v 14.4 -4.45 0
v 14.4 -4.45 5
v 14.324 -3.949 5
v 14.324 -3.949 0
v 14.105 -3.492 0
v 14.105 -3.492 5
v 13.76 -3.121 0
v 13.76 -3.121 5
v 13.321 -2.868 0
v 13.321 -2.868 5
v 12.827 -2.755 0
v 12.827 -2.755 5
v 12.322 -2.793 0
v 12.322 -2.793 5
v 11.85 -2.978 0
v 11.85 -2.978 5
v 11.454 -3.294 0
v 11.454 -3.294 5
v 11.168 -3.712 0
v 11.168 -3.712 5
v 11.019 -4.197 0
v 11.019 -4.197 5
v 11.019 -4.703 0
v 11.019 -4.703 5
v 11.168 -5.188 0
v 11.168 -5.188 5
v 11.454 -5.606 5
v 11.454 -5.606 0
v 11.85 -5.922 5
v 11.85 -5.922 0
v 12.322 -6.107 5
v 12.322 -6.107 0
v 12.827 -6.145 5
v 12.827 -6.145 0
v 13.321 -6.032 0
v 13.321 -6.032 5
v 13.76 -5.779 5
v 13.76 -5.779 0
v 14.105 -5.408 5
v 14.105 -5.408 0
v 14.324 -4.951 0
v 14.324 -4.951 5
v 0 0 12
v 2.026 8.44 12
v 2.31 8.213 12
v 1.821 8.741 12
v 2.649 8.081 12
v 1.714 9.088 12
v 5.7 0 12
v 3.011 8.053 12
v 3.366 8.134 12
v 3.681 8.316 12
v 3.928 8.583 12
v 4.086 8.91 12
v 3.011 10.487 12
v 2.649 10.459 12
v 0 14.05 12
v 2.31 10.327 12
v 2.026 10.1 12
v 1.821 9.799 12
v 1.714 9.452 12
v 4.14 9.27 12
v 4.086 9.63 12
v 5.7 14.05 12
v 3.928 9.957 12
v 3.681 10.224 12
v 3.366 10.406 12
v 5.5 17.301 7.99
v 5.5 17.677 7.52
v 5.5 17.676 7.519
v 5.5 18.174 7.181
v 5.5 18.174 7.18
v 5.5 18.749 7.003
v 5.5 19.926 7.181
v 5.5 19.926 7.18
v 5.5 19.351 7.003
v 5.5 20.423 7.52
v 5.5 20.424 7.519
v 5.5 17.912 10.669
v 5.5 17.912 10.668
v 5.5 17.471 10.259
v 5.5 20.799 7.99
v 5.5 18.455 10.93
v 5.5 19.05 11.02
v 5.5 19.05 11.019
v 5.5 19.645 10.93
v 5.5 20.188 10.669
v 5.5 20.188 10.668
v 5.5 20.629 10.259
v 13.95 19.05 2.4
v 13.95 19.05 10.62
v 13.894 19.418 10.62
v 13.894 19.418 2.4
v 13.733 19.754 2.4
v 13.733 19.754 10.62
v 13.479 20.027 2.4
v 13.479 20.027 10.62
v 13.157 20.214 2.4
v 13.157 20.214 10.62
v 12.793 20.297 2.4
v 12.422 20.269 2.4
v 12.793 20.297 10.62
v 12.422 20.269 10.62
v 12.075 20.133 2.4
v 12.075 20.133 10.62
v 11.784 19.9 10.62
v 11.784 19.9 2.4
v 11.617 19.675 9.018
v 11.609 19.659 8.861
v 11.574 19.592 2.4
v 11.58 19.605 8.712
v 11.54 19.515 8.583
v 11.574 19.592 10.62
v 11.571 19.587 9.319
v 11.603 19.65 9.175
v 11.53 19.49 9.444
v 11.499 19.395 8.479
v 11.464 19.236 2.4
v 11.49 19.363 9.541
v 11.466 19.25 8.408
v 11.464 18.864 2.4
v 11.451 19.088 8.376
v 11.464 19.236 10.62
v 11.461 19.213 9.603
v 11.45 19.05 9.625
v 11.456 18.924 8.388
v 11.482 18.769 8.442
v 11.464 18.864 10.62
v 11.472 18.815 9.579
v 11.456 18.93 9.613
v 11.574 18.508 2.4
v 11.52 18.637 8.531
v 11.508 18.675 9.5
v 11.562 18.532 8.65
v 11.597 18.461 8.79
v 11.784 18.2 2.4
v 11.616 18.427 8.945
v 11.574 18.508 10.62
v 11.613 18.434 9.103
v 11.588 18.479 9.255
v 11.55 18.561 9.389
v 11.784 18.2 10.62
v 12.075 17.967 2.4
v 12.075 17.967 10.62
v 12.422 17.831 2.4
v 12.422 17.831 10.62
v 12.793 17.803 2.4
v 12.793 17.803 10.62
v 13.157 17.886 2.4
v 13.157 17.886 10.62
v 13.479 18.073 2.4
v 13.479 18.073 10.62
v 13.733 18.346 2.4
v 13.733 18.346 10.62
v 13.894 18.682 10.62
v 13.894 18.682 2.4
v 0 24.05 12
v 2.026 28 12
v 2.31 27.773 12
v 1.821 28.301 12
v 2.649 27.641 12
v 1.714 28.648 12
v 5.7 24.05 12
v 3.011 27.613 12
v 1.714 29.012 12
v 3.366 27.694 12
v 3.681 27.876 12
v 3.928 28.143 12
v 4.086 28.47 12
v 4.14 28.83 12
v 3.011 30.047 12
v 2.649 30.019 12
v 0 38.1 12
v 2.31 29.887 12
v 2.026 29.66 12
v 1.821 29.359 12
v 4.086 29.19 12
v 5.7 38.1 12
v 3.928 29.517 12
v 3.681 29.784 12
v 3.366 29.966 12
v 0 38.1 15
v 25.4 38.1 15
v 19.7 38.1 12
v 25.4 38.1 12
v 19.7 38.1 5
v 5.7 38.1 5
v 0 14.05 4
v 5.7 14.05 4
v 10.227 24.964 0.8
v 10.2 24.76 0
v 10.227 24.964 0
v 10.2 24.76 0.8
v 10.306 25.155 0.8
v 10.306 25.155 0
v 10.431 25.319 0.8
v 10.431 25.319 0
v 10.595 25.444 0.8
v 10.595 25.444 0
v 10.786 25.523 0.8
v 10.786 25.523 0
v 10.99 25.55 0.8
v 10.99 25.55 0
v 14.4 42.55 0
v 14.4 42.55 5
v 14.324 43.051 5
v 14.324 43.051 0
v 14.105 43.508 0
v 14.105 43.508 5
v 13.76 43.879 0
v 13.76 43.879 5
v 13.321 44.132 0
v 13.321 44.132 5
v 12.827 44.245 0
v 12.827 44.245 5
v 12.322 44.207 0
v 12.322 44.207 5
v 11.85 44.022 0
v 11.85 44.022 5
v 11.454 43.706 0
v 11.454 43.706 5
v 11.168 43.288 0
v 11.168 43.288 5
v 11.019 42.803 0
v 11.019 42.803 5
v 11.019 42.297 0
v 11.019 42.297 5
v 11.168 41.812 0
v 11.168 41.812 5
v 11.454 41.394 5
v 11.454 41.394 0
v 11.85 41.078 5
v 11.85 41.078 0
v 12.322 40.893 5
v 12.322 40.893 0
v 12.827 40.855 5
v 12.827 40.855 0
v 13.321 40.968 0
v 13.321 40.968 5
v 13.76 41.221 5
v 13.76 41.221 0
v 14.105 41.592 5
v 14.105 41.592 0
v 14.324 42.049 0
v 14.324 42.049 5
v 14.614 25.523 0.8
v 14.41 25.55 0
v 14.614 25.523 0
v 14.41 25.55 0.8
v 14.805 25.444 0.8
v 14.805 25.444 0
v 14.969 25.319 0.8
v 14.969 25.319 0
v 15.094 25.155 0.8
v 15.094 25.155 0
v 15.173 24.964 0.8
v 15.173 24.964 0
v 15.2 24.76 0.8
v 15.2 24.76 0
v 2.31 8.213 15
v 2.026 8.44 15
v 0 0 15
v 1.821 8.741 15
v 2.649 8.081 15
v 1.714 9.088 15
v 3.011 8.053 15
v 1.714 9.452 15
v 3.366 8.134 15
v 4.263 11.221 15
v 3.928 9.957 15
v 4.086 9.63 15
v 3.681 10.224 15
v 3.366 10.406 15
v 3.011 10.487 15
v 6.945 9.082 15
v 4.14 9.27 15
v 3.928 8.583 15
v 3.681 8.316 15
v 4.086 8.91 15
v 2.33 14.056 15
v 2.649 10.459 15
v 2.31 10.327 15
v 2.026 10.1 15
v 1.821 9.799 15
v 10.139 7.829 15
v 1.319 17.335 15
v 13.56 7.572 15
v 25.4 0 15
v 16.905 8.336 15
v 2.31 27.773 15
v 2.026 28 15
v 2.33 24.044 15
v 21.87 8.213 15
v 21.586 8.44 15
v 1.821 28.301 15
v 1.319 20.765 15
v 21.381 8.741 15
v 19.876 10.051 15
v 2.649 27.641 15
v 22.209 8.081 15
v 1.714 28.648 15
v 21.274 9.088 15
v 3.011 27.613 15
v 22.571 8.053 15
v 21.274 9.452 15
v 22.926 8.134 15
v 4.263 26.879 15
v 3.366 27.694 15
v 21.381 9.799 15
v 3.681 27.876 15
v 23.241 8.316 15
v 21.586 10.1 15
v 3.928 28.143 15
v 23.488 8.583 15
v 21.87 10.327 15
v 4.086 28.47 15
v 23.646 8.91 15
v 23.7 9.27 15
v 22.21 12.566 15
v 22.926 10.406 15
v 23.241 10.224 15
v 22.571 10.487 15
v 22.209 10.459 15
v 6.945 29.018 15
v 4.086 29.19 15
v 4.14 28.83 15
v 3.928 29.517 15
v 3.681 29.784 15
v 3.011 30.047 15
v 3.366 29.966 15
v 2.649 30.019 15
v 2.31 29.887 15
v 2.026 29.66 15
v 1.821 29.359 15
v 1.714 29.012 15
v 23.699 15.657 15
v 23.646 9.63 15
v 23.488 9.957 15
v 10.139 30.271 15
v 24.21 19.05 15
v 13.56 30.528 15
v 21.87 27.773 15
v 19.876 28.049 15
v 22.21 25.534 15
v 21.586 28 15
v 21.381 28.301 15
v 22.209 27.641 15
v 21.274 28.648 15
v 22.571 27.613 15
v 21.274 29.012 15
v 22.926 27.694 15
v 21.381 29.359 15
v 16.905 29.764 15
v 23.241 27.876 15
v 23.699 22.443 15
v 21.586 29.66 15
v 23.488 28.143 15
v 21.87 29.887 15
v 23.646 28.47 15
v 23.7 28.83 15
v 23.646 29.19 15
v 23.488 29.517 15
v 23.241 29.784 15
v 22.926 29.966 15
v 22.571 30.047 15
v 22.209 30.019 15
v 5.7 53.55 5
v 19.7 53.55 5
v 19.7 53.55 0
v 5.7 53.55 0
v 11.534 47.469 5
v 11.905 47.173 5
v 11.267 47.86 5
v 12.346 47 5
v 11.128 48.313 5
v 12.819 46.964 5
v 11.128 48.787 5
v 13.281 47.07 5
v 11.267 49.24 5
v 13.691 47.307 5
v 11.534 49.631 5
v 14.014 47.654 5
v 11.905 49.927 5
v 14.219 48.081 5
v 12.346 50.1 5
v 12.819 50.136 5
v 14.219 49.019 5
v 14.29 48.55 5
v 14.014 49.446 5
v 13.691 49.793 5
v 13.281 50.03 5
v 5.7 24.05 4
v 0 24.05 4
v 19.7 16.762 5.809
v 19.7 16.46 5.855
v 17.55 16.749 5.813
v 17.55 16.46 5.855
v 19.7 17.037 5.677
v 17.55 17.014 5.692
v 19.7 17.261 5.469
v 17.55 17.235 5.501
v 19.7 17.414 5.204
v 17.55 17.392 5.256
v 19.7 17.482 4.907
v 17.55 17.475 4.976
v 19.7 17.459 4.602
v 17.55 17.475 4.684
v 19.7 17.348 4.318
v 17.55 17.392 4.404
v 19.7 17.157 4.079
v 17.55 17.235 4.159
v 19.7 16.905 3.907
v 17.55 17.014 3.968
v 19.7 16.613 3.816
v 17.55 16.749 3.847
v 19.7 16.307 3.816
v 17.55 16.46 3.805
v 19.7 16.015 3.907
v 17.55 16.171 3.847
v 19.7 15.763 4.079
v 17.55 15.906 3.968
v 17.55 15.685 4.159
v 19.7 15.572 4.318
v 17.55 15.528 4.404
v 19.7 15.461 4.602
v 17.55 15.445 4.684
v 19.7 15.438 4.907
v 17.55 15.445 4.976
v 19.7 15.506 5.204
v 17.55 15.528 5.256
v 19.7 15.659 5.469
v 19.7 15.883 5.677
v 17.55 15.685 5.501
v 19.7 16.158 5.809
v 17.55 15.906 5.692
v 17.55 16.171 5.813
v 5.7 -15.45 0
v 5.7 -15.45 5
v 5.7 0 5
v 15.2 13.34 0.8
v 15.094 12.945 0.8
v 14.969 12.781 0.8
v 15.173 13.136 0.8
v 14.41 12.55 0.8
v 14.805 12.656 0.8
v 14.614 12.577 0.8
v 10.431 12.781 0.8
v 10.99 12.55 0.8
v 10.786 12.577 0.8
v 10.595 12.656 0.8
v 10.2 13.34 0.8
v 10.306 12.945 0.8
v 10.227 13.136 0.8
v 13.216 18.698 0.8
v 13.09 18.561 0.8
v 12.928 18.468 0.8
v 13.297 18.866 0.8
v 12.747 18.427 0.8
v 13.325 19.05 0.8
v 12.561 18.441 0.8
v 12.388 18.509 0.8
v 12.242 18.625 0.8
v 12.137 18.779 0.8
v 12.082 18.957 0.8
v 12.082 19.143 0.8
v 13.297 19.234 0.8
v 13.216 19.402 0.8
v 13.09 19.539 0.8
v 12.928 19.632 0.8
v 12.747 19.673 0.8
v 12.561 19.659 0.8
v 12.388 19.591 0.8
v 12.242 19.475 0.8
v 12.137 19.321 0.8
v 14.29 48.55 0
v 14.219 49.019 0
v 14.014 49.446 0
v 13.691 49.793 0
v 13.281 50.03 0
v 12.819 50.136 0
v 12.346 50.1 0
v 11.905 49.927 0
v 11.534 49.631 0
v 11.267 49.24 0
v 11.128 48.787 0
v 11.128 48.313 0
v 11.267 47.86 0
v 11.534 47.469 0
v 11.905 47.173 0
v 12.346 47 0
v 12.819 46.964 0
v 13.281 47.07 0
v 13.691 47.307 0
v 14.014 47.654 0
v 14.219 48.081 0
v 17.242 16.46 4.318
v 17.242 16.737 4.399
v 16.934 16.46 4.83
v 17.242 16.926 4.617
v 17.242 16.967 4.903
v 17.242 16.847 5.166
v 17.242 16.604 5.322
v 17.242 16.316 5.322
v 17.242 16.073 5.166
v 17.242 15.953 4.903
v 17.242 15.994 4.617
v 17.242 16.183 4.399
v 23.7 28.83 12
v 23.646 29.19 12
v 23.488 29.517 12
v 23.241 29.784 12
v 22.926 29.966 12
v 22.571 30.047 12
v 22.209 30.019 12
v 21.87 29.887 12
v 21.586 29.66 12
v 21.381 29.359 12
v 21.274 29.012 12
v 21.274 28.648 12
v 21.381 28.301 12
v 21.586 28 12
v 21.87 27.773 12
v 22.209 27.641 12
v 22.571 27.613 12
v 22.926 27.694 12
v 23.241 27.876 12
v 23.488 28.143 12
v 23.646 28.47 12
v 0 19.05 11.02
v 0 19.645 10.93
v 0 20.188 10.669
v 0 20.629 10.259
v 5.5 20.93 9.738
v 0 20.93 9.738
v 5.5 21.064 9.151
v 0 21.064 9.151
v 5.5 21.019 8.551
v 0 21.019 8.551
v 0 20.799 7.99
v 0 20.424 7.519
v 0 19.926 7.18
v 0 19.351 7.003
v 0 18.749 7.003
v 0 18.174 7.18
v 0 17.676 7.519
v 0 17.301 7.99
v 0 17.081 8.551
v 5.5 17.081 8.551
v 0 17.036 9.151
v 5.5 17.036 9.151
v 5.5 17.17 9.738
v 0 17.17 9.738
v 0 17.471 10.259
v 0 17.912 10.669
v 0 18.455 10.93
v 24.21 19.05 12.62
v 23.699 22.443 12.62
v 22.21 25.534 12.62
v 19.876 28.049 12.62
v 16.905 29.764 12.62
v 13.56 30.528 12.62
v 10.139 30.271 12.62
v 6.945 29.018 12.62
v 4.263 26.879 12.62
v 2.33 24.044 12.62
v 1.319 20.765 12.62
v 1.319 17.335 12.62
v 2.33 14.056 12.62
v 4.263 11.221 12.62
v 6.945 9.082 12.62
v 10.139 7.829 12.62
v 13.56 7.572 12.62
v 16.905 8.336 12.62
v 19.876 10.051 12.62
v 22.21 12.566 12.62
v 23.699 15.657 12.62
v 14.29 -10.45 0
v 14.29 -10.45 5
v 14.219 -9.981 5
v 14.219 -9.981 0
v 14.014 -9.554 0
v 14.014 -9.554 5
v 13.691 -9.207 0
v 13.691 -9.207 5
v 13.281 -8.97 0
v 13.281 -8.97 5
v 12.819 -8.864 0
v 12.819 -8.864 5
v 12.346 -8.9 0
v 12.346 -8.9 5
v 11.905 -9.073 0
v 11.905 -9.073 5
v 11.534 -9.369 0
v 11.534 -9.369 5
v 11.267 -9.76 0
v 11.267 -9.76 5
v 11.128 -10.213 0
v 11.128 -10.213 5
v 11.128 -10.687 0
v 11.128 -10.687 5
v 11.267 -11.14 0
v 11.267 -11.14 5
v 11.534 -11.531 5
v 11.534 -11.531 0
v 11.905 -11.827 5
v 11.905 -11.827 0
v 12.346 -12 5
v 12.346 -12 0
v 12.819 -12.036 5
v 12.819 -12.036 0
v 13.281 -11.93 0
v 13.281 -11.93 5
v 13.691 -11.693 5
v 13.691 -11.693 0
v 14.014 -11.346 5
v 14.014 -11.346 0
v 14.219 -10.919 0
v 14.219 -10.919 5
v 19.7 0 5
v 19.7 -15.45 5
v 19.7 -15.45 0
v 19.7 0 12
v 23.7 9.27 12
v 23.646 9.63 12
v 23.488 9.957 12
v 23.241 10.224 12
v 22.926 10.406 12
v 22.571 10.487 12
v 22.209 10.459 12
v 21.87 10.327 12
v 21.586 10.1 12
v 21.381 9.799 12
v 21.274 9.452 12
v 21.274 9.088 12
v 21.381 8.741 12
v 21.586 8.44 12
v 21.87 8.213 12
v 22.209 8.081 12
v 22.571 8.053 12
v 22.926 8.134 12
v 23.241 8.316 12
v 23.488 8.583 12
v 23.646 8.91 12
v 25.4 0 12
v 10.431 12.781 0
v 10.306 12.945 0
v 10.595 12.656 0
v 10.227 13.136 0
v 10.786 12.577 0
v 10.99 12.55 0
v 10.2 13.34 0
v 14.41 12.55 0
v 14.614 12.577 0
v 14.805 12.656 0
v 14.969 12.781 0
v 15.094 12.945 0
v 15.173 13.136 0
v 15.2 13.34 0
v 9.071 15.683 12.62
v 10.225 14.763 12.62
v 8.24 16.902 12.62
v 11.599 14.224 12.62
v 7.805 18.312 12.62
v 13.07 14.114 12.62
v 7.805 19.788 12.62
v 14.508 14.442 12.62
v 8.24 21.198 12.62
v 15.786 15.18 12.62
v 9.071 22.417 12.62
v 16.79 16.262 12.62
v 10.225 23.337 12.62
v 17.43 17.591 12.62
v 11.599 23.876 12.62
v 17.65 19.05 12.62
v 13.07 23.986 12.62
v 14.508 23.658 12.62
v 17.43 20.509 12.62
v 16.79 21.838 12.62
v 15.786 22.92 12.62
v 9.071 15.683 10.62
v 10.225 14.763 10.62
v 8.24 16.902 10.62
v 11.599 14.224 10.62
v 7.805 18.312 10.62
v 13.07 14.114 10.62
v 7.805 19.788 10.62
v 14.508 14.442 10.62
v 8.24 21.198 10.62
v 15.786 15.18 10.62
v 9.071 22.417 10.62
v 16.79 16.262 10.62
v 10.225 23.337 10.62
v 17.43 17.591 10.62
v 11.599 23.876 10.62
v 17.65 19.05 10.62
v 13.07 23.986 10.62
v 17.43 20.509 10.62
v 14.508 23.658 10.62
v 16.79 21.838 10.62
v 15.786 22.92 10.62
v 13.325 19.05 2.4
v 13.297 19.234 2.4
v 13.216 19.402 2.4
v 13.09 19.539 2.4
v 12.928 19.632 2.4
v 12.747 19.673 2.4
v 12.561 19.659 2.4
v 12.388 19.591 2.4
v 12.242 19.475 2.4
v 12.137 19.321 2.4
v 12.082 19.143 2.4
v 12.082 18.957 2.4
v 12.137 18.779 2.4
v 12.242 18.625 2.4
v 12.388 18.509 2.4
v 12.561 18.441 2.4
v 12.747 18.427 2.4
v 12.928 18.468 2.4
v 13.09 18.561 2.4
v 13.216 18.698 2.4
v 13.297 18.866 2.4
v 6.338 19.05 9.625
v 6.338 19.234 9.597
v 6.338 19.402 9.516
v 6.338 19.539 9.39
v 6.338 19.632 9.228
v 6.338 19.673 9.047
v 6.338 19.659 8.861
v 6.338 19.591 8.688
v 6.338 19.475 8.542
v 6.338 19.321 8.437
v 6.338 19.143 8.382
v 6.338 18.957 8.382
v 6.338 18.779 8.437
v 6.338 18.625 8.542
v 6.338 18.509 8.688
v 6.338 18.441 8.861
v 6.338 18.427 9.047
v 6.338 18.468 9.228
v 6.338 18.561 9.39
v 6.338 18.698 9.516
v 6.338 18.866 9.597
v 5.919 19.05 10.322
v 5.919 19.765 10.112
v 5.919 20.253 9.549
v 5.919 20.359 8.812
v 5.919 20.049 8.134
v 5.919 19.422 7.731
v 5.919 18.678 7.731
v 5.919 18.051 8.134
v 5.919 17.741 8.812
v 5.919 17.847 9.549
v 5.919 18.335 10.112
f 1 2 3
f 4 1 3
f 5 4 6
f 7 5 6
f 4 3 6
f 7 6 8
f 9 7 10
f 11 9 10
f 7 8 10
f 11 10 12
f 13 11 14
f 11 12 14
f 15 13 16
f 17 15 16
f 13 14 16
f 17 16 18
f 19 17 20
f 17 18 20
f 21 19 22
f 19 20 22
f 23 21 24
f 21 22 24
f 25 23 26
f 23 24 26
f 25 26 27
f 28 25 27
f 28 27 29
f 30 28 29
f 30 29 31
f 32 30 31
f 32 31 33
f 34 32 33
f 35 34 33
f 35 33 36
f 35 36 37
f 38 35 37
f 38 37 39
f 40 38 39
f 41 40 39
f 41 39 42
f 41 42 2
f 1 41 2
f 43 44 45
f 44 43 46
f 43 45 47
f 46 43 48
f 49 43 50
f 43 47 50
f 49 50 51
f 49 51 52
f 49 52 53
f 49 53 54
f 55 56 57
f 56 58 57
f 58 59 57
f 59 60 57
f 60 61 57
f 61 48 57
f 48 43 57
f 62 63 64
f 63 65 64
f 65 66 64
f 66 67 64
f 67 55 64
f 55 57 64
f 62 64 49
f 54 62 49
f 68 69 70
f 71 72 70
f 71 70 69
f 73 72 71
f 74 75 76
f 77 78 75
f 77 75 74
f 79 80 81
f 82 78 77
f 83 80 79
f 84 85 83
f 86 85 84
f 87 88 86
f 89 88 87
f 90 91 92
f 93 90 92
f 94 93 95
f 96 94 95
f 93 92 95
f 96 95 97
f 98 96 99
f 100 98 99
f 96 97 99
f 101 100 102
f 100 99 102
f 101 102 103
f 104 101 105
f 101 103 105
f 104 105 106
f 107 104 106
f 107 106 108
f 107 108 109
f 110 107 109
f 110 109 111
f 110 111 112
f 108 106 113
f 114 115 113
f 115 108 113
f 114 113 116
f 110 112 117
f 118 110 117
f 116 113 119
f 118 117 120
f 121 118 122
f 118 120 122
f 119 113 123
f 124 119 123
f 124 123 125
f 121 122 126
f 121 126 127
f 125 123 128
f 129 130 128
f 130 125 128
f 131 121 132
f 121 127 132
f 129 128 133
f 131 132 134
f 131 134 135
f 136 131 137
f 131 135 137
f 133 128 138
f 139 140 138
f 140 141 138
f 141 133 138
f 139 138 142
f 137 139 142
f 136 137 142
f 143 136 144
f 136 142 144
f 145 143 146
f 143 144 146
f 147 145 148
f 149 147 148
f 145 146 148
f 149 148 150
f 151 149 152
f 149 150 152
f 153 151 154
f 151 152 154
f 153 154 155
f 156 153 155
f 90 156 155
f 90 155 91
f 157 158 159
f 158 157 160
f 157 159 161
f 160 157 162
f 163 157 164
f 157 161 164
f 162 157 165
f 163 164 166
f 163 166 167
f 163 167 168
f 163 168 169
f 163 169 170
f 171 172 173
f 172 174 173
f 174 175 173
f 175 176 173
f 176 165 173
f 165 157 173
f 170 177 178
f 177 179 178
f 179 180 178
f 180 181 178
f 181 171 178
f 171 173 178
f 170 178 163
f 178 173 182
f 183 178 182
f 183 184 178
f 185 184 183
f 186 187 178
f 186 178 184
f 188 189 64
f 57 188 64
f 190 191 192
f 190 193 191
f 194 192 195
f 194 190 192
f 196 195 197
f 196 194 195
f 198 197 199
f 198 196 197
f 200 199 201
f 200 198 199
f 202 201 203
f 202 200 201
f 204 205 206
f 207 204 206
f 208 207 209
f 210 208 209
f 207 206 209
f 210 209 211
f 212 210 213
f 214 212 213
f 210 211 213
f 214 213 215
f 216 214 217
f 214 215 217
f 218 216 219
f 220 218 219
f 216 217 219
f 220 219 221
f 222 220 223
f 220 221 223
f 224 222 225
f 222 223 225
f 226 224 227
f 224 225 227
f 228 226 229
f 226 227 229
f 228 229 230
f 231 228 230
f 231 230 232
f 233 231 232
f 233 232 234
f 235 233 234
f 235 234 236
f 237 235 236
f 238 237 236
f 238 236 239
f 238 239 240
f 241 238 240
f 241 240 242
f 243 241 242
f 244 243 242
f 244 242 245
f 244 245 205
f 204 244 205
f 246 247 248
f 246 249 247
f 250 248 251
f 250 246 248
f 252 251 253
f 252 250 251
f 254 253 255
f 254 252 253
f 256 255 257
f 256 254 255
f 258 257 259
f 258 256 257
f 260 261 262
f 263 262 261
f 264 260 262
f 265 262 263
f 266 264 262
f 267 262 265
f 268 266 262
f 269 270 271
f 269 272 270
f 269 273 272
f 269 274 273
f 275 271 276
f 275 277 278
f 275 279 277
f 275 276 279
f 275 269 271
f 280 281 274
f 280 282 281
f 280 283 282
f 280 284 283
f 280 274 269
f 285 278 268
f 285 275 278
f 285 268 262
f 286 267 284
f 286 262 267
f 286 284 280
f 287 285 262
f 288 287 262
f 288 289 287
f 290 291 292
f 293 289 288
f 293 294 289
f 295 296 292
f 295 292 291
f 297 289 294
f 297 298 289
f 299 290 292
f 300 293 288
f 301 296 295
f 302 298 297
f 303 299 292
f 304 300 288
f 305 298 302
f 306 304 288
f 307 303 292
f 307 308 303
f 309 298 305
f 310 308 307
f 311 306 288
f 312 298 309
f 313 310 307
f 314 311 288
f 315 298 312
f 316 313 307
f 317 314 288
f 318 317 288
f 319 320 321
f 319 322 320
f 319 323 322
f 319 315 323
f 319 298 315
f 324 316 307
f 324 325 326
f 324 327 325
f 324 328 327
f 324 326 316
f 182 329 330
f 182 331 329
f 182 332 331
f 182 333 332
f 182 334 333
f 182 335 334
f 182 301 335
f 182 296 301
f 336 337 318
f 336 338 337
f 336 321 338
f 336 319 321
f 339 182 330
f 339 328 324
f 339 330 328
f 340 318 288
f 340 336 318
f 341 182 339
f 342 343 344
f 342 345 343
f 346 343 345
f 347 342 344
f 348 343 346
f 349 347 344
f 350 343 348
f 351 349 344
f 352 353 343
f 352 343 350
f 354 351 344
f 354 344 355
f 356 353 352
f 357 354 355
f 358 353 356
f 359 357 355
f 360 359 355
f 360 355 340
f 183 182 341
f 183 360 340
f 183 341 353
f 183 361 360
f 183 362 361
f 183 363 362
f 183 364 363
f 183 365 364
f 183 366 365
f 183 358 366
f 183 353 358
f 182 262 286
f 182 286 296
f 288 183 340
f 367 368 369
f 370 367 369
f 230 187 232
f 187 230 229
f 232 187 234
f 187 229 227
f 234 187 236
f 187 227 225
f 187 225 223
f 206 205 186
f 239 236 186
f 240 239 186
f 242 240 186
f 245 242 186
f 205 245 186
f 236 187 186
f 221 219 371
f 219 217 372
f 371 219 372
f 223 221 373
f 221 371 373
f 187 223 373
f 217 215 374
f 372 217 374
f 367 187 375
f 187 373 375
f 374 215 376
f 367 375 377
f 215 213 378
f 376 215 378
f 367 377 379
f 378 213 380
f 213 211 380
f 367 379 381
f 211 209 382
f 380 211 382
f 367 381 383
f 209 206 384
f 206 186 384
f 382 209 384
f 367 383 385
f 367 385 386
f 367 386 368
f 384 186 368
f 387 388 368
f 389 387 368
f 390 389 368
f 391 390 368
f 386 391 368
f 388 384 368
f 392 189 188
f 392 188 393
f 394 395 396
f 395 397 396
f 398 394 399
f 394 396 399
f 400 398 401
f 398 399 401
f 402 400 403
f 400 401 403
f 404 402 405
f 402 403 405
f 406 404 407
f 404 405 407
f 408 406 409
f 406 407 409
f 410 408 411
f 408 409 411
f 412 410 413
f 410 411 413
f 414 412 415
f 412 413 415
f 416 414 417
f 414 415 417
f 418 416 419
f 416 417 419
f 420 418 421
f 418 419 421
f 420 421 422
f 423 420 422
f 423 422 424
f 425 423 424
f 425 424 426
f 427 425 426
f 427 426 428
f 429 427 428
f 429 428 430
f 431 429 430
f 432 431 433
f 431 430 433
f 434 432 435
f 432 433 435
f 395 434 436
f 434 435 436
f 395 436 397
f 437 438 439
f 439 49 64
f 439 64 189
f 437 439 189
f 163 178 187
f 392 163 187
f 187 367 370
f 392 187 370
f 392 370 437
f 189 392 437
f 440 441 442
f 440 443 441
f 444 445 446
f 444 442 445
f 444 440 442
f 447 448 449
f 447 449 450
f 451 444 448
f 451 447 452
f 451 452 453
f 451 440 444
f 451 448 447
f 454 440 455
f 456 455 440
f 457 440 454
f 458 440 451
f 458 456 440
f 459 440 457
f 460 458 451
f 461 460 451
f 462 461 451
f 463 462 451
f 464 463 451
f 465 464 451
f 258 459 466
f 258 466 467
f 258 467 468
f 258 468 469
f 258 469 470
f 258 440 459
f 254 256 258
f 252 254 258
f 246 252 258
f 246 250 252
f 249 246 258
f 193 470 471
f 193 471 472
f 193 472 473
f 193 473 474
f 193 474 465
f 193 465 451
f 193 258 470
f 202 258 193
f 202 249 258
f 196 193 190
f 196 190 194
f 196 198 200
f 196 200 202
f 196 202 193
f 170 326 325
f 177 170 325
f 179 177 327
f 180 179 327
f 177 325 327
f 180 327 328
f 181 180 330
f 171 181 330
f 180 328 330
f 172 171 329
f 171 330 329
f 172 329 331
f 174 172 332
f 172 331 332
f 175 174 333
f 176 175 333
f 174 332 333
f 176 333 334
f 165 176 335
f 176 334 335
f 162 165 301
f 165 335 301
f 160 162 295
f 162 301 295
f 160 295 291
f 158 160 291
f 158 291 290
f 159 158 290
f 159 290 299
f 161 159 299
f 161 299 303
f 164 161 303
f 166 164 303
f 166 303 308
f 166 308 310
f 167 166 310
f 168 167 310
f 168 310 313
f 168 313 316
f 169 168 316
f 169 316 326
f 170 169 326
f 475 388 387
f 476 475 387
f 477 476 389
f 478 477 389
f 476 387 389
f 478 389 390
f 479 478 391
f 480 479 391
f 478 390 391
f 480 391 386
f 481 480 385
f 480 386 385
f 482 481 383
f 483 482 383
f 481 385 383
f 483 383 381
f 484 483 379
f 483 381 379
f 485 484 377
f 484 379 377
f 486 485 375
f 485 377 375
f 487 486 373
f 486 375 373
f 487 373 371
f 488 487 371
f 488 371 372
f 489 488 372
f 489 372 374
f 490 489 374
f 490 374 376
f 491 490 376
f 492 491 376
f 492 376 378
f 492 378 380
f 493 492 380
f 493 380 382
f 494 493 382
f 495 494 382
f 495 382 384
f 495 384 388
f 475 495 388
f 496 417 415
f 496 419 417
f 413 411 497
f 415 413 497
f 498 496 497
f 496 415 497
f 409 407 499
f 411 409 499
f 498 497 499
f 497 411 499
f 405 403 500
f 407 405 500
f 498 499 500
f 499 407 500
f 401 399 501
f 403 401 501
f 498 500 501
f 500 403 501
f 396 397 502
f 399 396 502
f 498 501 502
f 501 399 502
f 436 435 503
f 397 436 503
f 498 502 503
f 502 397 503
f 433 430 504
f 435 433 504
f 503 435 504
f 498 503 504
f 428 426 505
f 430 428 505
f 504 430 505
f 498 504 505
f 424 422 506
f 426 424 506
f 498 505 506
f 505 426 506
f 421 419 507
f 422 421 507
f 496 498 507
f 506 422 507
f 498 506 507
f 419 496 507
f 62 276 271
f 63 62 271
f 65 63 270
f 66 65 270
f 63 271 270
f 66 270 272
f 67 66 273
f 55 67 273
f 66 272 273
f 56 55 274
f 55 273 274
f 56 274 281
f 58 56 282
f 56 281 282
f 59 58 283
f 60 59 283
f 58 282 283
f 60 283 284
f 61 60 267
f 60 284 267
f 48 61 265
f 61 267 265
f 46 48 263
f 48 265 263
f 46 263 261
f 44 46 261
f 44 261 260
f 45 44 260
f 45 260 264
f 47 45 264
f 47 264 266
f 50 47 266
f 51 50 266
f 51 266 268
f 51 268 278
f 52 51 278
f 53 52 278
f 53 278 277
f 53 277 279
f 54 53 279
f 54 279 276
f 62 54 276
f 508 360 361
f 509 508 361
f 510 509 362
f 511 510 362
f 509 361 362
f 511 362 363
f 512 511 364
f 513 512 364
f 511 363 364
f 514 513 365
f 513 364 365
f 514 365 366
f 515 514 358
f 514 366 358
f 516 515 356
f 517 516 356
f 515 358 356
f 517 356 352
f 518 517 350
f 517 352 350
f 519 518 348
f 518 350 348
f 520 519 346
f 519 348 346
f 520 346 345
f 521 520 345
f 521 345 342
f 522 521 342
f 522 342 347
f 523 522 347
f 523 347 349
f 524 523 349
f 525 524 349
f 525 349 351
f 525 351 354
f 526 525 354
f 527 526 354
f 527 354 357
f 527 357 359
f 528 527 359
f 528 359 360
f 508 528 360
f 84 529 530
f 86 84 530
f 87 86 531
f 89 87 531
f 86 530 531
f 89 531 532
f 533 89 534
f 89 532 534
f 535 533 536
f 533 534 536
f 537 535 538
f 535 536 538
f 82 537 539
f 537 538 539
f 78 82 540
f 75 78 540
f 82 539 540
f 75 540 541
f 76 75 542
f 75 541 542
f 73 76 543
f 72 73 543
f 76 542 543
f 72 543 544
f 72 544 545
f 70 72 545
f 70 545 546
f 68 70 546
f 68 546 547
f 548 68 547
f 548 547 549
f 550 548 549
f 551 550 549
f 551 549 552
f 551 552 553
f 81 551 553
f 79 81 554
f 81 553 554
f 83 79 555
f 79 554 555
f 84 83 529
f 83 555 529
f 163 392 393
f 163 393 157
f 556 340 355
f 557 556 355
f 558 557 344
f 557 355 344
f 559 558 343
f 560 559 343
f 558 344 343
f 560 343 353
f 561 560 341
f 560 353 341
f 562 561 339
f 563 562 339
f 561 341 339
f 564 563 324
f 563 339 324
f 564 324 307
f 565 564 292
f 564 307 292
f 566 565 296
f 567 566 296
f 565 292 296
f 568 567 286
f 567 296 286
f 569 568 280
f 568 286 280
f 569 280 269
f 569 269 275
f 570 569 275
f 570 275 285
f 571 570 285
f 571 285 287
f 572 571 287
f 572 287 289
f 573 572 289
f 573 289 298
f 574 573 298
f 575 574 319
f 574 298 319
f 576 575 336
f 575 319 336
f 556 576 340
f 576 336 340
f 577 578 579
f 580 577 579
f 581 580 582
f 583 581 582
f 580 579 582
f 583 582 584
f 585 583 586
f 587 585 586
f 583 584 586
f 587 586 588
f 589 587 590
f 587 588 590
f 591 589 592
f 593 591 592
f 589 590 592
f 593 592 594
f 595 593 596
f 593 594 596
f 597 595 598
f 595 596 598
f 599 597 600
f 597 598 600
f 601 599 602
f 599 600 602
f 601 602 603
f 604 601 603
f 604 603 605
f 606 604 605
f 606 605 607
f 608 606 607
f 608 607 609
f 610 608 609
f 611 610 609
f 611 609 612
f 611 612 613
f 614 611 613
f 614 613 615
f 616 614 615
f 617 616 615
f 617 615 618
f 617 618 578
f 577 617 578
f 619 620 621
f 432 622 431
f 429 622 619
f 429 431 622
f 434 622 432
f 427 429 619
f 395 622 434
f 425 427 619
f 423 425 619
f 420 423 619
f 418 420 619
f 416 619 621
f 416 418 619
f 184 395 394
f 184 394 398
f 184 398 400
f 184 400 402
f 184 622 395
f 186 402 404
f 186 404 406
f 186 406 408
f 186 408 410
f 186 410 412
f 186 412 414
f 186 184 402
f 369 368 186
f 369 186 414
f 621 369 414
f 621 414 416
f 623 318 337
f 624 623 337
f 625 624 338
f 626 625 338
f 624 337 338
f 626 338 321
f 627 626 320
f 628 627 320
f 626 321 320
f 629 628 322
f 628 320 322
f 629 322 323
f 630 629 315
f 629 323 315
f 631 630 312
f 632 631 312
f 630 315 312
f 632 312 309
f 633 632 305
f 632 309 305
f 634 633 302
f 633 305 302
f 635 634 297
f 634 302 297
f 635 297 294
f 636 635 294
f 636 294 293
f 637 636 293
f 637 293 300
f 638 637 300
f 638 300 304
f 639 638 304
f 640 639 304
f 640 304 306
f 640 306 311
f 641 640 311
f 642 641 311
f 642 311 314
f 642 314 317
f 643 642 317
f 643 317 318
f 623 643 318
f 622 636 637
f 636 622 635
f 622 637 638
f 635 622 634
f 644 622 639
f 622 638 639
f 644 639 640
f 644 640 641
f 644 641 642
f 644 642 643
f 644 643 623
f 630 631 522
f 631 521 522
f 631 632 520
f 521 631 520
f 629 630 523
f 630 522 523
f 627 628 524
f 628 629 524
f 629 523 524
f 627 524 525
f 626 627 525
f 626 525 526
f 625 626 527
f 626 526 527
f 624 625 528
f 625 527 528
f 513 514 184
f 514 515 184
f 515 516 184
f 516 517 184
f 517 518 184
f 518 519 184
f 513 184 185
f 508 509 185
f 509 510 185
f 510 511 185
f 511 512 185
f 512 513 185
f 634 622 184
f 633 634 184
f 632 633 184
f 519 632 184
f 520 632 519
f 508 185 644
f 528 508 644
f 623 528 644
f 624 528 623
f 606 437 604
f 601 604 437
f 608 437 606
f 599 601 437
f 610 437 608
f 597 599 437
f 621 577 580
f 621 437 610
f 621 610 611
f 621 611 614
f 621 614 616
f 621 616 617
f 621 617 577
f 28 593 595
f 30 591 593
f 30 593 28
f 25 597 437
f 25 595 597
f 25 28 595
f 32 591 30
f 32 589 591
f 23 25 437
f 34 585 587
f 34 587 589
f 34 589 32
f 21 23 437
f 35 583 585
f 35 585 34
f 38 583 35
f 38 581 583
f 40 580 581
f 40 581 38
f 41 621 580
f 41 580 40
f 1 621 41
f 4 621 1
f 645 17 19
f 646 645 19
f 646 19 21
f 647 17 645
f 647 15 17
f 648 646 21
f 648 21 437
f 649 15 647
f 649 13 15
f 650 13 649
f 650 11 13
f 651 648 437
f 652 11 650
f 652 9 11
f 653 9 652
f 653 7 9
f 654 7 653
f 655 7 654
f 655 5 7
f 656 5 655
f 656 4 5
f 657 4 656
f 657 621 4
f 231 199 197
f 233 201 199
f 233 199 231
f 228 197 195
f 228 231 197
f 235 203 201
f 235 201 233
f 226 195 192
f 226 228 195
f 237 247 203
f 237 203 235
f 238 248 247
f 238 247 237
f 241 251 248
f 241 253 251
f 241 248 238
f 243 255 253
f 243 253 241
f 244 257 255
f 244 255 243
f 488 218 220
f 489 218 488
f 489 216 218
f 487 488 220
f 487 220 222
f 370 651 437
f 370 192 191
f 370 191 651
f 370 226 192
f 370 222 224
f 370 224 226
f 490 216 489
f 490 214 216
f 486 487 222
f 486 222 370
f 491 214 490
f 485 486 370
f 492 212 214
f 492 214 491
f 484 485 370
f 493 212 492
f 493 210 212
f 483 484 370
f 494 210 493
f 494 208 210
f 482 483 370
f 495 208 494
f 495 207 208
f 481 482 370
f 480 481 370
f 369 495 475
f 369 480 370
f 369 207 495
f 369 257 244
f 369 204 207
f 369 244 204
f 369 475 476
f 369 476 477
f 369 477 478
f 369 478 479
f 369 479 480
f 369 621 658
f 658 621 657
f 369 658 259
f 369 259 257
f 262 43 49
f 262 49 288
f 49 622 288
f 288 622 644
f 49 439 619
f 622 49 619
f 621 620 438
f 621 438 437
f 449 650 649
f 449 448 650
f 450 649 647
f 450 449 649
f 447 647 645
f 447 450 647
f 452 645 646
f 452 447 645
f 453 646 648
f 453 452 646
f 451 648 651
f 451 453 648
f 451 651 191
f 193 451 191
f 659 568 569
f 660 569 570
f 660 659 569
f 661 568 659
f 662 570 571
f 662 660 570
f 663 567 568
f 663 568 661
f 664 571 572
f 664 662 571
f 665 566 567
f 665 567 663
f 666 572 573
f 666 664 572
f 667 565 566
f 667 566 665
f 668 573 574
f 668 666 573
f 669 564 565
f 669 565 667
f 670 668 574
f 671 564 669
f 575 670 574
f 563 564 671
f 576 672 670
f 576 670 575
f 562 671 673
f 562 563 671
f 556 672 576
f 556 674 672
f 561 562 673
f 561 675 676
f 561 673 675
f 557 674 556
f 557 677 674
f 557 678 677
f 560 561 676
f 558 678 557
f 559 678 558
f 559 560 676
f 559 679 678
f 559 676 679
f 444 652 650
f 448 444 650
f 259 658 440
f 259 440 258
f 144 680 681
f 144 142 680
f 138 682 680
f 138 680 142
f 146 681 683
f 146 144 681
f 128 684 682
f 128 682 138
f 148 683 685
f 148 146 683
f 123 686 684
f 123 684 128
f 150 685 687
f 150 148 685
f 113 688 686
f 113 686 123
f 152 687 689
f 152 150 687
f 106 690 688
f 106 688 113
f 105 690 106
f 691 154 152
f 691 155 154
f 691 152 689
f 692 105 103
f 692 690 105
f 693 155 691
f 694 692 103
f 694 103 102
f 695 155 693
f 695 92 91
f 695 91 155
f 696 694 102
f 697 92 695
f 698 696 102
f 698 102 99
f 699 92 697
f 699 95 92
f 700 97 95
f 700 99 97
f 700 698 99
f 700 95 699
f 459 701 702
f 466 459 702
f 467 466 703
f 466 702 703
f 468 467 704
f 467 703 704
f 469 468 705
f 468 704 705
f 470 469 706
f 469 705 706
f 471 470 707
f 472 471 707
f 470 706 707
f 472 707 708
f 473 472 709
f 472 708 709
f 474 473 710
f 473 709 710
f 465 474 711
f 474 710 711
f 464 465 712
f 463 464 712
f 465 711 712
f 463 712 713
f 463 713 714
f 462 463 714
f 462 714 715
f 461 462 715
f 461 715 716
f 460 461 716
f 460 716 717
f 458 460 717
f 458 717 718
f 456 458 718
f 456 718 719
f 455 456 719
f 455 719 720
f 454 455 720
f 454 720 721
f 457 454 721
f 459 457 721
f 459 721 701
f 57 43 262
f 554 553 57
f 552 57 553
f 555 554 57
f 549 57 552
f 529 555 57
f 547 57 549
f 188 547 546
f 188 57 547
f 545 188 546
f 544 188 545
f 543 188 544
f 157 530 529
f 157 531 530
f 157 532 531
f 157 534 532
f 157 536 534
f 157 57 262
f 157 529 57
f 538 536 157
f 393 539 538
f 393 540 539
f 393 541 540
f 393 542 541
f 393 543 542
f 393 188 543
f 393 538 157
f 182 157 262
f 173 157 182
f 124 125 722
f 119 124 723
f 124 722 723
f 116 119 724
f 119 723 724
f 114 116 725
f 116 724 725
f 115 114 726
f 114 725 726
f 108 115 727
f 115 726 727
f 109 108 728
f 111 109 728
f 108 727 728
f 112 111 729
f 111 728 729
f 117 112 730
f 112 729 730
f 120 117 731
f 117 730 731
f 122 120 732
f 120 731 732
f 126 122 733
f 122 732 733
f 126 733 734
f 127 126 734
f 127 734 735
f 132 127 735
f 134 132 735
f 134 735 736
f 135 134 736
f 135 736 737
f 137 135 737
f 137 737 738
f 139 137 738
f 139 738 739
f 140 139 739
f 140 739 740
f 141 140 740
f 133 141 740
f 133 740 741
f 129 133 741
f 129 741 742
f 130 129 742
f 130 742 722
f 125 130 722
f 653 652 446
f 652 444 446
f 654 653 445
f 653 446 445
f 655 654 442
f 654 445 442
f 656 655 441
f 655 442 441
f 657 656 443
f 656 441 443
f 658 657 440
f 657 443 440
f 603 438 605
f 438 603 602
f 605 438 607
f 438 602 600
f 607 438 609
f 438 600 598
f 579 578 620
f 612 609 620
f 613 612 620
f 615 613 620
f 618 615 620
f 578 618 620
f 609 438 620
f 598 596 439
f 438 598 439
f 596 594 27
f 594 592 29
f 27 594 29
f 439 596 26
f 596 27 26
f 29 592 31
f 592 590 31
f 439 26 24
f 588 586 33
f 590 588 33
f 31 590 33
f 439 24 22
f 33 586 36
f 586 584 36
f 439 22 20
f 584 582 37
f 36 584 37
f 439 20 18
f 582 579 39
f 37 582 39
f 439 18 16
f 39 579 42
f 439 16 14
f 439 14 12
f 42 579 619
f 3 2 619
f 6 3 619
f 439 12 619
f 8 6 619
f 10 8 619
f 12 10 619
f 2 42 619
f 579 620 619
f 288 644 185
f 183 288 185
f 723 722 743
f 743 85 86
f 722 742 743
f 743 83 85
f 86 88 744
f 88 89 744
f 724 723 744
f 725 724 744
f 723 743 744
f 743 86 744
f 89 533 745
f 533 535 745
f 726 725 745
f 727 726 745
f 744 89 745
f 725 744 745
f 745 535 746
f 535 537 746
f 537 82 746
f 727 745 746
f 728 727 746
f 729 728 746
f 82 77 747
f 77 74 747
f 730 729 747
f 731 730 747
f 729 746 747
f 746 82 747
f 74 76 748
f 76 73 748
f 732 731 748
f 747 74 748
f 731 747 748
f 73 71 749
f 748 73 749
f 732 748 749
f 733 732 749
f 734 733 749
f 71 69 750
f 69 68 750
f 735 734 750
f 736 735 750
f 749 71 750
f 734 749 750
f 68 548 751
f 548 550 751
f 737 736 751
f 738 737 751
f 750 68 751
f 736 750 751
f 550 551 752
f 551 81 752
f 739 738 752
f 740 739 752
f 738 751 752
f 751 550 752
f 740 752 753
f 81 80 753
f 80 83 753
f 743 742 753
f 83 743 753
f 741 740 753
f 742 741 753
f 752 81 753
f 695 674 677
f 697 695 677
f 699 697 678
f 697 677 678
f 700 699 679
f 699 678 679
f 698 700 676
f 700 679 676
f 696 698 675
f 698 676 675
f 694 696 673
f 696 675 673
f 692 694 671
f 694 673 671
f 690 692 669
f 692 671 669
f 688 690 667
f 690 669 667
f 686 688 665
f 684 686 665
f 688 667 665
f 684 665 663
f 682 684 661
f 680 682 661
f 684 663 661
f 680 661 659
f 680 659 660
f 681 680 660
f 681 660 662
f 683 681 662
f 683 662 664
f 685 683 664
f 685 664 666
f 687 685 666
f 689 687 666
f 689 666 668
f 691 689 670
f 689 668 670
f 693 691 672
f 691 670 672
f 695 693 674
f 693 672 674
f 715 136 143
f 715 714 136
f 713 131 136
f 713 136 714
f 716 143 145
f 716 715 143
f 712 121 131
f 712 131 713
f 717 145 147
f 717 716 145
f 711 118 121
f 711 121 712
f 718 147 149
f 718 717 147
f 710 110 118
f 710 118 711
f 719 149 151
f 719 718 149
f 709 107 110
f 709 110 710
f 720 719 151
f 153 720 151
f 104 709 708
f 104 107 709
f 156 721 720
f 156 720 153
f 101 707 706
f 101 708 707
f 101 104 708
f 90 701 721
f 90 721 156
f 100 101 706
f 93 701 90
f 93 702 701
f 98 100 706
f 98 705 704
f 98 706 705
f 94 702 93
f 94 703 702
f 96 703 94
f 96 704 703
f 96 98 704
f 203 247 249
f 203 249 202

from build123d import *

# Parameters (mm, degrees)
SKETCH1_W                          = 25.4
SKETCH1_H                          = 38.1
BOSS_EXTRUDE1_DEPTH                = 15
SKETCH2_R                          = 11.51
CUT_EXTRUDE1_DEPTH                 = 2.38
SKETCH3_R                          = 4.95
CUT_EXTRUDE2_DEPTH                 = 2
SKETCH4_R                          = 0.625
CUT_EXTRUDE3_DEPTH                 = 48.005897502
SKETCH5_R                          = 1.22
CUT_EXTRUDE4_DEPTH                 = 49.184748624
SKETCH7_W                          = 5.7
SKETCH7_H                          = 12
CUT_EXTRUDE5_DEPTH                 = 49.184748624
SKETCH12_W                         = 5
SKETCH12_H                         = 15.45
BOSS_EXTRUDE2_DEPTH                = 14
SKETCH13_R                         = 1.59
SKETCH13_R_2                       = 1.7
CUT_EXTRUDE8_DEPTH                 = 7.5
TAP_DRILL_FOR_M2_5X0_45_TAP1_D     = 2.05
TAP_DRILL_FOR_M2_5X0_45_TAP1_DEPTH = 2.15
TAP_DRILL_FOR_M2_5X0_45_TAP1_TIP   = 0.615882135
SKETCH21_W                         = 5
SKETCH21_H                         = 13
CUT_EXTRUDE10_DEPTH                = 0.8
FILLET1_R                          = 0.79
SKETCH22_W                         = 8
SKETCH22_H                         = 10
BOSS_EXTRUDE3_DEPTH                = 5.7
SKETCH23_R                         = 2.02
CUT_EXTRUDE11_DEPTH                = 5.5
TAP_DRILL_FOR_10_32_TAP1_D         = 4.0386
TAP_DRILL_FOR_10_32_TAP1_DEPTH     = 5.5
TAP_DRILL_FOR_10_32_TAP1_TIP       = 1.213317848
SKETCH26_R                         = 0.625
CUT_EXTRUDE12_DEPTH                = 12.7
SKETCH27_R                         = 1.25
CUT_EXTRUDE13_DEPTH                = 8.22


with BuildPart() as part:
    # Sketch1 → Boss-Extrude1 (new body)
    with BuildSketch(Plane.XY):
        with Locations((12.7, 19.05)):
            Rectangle(SKETCH1_W, SKETCH1_H)
    extrude(amount=BOSS_EXTRUDE1_DEPTH)

    # Sketch2 → Cut-Extrude1 (cut)
    with BuildSketch(Plane.XY.offset(15)):
        with Locations((12.7, 19.05)):
            Circle(SKETCH2_R)
    extrude(amount=-CUT_EXTRUDE1_DEPTH, mode=Mode.SUBTRACT)

    # Sketch3 → Cut-Extrude2 (cut)
    with BuildSketch(Plane.XY.offset(12.62)):
        with Locations((12.7, 19.05)):
            Circle(SKETCH3_R)
    extrude(amount=-CUT_EXTRUDE2_DEPTH, mode=Mode.SUBTRACT)

    # Sketch4 → Cut-Extrude3 (cut, through all)
    with BuildSketch(Plane.XY.offset(10.62)):
        with Locations((12.7, 19.05)):
            Circle(SKETCH4_R)
    extrude(amount=-CUT_EXTRUDE3_DEPTH, mode=Mode.SUBTRACT)

    # Sketch5 → Cut-Extrude4 (cut, through all)
    with BuildSketch(Plane.XY.offset(15)):
        with Locations((2.92, 28.83)):
            Circle(SKETCH5_R)
        with Locations((22.48, 28.83)):
            Circle(SKETCH5_R)
        with Locations((22.48, 9.27)):
            Circle(SKETCH5_R)
        with Locations((2.92, 9.27)):
            Circle(SKETCH5_R)
    extrude(amount=-CUT_EXTRUDE4_DEPTH, mode=Mode.SUBTRACT)

    # Sketch7 → Cut-Extrude5 (cut, through all)
    with BuildSketch(Plane(origin=(0, 38.1, 0), x_dir=(1, 0, 0), z_dir=(0, 1, 0))):
        with Locations((2.85, -6)):
            Rectangle(SKETCH7_W, SKETCH7_H)
        with Locations((22.55, -6)):
            Rectangle(SKETCH7_W, SKETCH7_H)
    extrude(amount=-CUT_EXTRUDE5_DEPTH, mode=Mode.SUBTRACT)

    # Sketch12 → Boss-Extrude2 (add)
    with BuildSketch(Plane(origin=(19.7, 0, 0), x_dir=(0, 0, -1), z_dir=(1, 0, 0))):
        with Locations((-2.5, 45.825)):
            Rectangle(SKETCH12_W, SKETCH12_H)
        with Locations((-2.5, -7.725)):
            Rectangle(SKETCH12_W, SKETCH12_H)
    extrude(amount=-BOSS_EXTRUDE2_DEPTH)

    # Sketch13 → Cut-Extrude8 (cut)
    with BuildSketch(Plane.XY.offset(5)):
        with Locations((12.7, 48.55)):
            Circle(SKETCH13_R)
        with Locations((12.7, 42.55)):
            Circle(SKETCH13_R_2)
        with Locations((12.7, -4.45)):
            Circle(SKETCH13_R_2)
        with Locations((12.7, -10.45)):
            Circle(SKETCH13_R)
    extrude(amount=-CUT_EXTRUDE8_DEPTH, mode=Mode.SUBTRACT)

    # Tap Drill for M2.5x0.45 Tap1
    with Locations(Plane(origin=(19.7, 0, 0), x_dir=(0, 0, -1), z_dir=(1, 0, 0))):
        with Locations((-4.83, 16.46)):
            Hole(TAP_DRILL_FOR_M2_5X0_45_TAP1_D / 2, depth=TAP_DRILL_FOR_M2_5X0_45_TAP1_DEPTH)
            with Locations((0, 0, -(TAP_DRILL_FOR_M2_5X0_45_TAP1_DEPTH + TAP_DRILL_FOR_M2_5X0_45_TAP1_TIP / 2))):  # 118° drill point
                Cone(0, TAP_DRILL_FOR_M2_5X0_45_TAP1_D / 2, TAP_DRILL_FOR_M2_5X0_45_TAP1_TIP, mode=Mode.SUBTRACT)

    # Sketch21 → Cut-Extrude10 (cut)
    with BuildSketch(Plane(origin=(0, 0, 0), x_dir=(-1, 0, 0), z_dir=(0, 0, -1))):
        with Locations((-12.7, 19.05)):
            Rectangle(SKETCH21_W, SKETCH21_H)
    extrude(amount=-CUT_EXTRUDE10_DEPTH, mode=Mode.SUBTRACT)

    # Fillet1
    fillet1_edges = [part.edges().sort_by_distance(p)[0] for p in [
        (10.2, 25.55, 0.4),
        (10.2, 12.55, 0.4),
        (15.2, 12.55, 0.4),
        (15.2, 25.55, 0.4),
    ]]
    fillet(fillet1_edges, radius=FILLET1_R)

    # Sketch22 → Boss-Extrude3 (add)
    with BuildSketch(Plane.ZY.offset(-5.7)):
        with Locations((8, 19.05)):
            Rectangle(SKETCH22_W, SKETCH22_H)
    extrude(amount=BOSS_EXTRUDE3_DEPTH)

    # Sketch23 → Cut-Extrude11 (cut)
    with BuildSketch(Plane.ZY):
        with Locations((9, 19.05)):
            Circle(SKETCH23_R)
    extrude(amount=-CUT_EXTRUDE11_DEPTH, mode=Mode.SUBTRACT)

    # Tap Drill for #10-32 Tap1
    with Locations(Plane.ZY):
        with Locations((9, 19.05)):
            Hole(TAP_DRILL_FOR_10_32_TAP1_D / 2, depth=TAP_DRILL_FOR_10_32_TAP1_DEPTH)
            with Locations((0, 0, -(TAP_DRILL_FOR_10_32_TAP1_DEPTH + TAP_DRILL_FOR_10_32_TAP1_TIP / 2))):  # 118° drill point
                Cone(0, TAP_DRILL_FOR_10_32_TAP1_D / 2, TAP_DRILL_FOR_10_32_TAP1_TIP, mode=Mode.SUBTRACT)

    # Sketch26 → Cut-Extrude12 (cut)
    with BuildSketch(Plane.ZY):
        with Locations((9, 19.05)):
            Circle(SKETCH26_R)
    extrude(amount=-CUT_EXTRUDE12_DEPTH, mode=Mode.SUBTRACT)

    # Sketch27 → Cut-Extrude13 (cut)
    with BuildSketch(Plane.XY.offset(10.62)):
        with Locations((12.7, 19.05)):
            Circle(SKETCH27_R)
    extrude(amount=-CUT_EXTRUDE13_DEPTH, mode=Mode.SUBTRACT)


solid = part.part
